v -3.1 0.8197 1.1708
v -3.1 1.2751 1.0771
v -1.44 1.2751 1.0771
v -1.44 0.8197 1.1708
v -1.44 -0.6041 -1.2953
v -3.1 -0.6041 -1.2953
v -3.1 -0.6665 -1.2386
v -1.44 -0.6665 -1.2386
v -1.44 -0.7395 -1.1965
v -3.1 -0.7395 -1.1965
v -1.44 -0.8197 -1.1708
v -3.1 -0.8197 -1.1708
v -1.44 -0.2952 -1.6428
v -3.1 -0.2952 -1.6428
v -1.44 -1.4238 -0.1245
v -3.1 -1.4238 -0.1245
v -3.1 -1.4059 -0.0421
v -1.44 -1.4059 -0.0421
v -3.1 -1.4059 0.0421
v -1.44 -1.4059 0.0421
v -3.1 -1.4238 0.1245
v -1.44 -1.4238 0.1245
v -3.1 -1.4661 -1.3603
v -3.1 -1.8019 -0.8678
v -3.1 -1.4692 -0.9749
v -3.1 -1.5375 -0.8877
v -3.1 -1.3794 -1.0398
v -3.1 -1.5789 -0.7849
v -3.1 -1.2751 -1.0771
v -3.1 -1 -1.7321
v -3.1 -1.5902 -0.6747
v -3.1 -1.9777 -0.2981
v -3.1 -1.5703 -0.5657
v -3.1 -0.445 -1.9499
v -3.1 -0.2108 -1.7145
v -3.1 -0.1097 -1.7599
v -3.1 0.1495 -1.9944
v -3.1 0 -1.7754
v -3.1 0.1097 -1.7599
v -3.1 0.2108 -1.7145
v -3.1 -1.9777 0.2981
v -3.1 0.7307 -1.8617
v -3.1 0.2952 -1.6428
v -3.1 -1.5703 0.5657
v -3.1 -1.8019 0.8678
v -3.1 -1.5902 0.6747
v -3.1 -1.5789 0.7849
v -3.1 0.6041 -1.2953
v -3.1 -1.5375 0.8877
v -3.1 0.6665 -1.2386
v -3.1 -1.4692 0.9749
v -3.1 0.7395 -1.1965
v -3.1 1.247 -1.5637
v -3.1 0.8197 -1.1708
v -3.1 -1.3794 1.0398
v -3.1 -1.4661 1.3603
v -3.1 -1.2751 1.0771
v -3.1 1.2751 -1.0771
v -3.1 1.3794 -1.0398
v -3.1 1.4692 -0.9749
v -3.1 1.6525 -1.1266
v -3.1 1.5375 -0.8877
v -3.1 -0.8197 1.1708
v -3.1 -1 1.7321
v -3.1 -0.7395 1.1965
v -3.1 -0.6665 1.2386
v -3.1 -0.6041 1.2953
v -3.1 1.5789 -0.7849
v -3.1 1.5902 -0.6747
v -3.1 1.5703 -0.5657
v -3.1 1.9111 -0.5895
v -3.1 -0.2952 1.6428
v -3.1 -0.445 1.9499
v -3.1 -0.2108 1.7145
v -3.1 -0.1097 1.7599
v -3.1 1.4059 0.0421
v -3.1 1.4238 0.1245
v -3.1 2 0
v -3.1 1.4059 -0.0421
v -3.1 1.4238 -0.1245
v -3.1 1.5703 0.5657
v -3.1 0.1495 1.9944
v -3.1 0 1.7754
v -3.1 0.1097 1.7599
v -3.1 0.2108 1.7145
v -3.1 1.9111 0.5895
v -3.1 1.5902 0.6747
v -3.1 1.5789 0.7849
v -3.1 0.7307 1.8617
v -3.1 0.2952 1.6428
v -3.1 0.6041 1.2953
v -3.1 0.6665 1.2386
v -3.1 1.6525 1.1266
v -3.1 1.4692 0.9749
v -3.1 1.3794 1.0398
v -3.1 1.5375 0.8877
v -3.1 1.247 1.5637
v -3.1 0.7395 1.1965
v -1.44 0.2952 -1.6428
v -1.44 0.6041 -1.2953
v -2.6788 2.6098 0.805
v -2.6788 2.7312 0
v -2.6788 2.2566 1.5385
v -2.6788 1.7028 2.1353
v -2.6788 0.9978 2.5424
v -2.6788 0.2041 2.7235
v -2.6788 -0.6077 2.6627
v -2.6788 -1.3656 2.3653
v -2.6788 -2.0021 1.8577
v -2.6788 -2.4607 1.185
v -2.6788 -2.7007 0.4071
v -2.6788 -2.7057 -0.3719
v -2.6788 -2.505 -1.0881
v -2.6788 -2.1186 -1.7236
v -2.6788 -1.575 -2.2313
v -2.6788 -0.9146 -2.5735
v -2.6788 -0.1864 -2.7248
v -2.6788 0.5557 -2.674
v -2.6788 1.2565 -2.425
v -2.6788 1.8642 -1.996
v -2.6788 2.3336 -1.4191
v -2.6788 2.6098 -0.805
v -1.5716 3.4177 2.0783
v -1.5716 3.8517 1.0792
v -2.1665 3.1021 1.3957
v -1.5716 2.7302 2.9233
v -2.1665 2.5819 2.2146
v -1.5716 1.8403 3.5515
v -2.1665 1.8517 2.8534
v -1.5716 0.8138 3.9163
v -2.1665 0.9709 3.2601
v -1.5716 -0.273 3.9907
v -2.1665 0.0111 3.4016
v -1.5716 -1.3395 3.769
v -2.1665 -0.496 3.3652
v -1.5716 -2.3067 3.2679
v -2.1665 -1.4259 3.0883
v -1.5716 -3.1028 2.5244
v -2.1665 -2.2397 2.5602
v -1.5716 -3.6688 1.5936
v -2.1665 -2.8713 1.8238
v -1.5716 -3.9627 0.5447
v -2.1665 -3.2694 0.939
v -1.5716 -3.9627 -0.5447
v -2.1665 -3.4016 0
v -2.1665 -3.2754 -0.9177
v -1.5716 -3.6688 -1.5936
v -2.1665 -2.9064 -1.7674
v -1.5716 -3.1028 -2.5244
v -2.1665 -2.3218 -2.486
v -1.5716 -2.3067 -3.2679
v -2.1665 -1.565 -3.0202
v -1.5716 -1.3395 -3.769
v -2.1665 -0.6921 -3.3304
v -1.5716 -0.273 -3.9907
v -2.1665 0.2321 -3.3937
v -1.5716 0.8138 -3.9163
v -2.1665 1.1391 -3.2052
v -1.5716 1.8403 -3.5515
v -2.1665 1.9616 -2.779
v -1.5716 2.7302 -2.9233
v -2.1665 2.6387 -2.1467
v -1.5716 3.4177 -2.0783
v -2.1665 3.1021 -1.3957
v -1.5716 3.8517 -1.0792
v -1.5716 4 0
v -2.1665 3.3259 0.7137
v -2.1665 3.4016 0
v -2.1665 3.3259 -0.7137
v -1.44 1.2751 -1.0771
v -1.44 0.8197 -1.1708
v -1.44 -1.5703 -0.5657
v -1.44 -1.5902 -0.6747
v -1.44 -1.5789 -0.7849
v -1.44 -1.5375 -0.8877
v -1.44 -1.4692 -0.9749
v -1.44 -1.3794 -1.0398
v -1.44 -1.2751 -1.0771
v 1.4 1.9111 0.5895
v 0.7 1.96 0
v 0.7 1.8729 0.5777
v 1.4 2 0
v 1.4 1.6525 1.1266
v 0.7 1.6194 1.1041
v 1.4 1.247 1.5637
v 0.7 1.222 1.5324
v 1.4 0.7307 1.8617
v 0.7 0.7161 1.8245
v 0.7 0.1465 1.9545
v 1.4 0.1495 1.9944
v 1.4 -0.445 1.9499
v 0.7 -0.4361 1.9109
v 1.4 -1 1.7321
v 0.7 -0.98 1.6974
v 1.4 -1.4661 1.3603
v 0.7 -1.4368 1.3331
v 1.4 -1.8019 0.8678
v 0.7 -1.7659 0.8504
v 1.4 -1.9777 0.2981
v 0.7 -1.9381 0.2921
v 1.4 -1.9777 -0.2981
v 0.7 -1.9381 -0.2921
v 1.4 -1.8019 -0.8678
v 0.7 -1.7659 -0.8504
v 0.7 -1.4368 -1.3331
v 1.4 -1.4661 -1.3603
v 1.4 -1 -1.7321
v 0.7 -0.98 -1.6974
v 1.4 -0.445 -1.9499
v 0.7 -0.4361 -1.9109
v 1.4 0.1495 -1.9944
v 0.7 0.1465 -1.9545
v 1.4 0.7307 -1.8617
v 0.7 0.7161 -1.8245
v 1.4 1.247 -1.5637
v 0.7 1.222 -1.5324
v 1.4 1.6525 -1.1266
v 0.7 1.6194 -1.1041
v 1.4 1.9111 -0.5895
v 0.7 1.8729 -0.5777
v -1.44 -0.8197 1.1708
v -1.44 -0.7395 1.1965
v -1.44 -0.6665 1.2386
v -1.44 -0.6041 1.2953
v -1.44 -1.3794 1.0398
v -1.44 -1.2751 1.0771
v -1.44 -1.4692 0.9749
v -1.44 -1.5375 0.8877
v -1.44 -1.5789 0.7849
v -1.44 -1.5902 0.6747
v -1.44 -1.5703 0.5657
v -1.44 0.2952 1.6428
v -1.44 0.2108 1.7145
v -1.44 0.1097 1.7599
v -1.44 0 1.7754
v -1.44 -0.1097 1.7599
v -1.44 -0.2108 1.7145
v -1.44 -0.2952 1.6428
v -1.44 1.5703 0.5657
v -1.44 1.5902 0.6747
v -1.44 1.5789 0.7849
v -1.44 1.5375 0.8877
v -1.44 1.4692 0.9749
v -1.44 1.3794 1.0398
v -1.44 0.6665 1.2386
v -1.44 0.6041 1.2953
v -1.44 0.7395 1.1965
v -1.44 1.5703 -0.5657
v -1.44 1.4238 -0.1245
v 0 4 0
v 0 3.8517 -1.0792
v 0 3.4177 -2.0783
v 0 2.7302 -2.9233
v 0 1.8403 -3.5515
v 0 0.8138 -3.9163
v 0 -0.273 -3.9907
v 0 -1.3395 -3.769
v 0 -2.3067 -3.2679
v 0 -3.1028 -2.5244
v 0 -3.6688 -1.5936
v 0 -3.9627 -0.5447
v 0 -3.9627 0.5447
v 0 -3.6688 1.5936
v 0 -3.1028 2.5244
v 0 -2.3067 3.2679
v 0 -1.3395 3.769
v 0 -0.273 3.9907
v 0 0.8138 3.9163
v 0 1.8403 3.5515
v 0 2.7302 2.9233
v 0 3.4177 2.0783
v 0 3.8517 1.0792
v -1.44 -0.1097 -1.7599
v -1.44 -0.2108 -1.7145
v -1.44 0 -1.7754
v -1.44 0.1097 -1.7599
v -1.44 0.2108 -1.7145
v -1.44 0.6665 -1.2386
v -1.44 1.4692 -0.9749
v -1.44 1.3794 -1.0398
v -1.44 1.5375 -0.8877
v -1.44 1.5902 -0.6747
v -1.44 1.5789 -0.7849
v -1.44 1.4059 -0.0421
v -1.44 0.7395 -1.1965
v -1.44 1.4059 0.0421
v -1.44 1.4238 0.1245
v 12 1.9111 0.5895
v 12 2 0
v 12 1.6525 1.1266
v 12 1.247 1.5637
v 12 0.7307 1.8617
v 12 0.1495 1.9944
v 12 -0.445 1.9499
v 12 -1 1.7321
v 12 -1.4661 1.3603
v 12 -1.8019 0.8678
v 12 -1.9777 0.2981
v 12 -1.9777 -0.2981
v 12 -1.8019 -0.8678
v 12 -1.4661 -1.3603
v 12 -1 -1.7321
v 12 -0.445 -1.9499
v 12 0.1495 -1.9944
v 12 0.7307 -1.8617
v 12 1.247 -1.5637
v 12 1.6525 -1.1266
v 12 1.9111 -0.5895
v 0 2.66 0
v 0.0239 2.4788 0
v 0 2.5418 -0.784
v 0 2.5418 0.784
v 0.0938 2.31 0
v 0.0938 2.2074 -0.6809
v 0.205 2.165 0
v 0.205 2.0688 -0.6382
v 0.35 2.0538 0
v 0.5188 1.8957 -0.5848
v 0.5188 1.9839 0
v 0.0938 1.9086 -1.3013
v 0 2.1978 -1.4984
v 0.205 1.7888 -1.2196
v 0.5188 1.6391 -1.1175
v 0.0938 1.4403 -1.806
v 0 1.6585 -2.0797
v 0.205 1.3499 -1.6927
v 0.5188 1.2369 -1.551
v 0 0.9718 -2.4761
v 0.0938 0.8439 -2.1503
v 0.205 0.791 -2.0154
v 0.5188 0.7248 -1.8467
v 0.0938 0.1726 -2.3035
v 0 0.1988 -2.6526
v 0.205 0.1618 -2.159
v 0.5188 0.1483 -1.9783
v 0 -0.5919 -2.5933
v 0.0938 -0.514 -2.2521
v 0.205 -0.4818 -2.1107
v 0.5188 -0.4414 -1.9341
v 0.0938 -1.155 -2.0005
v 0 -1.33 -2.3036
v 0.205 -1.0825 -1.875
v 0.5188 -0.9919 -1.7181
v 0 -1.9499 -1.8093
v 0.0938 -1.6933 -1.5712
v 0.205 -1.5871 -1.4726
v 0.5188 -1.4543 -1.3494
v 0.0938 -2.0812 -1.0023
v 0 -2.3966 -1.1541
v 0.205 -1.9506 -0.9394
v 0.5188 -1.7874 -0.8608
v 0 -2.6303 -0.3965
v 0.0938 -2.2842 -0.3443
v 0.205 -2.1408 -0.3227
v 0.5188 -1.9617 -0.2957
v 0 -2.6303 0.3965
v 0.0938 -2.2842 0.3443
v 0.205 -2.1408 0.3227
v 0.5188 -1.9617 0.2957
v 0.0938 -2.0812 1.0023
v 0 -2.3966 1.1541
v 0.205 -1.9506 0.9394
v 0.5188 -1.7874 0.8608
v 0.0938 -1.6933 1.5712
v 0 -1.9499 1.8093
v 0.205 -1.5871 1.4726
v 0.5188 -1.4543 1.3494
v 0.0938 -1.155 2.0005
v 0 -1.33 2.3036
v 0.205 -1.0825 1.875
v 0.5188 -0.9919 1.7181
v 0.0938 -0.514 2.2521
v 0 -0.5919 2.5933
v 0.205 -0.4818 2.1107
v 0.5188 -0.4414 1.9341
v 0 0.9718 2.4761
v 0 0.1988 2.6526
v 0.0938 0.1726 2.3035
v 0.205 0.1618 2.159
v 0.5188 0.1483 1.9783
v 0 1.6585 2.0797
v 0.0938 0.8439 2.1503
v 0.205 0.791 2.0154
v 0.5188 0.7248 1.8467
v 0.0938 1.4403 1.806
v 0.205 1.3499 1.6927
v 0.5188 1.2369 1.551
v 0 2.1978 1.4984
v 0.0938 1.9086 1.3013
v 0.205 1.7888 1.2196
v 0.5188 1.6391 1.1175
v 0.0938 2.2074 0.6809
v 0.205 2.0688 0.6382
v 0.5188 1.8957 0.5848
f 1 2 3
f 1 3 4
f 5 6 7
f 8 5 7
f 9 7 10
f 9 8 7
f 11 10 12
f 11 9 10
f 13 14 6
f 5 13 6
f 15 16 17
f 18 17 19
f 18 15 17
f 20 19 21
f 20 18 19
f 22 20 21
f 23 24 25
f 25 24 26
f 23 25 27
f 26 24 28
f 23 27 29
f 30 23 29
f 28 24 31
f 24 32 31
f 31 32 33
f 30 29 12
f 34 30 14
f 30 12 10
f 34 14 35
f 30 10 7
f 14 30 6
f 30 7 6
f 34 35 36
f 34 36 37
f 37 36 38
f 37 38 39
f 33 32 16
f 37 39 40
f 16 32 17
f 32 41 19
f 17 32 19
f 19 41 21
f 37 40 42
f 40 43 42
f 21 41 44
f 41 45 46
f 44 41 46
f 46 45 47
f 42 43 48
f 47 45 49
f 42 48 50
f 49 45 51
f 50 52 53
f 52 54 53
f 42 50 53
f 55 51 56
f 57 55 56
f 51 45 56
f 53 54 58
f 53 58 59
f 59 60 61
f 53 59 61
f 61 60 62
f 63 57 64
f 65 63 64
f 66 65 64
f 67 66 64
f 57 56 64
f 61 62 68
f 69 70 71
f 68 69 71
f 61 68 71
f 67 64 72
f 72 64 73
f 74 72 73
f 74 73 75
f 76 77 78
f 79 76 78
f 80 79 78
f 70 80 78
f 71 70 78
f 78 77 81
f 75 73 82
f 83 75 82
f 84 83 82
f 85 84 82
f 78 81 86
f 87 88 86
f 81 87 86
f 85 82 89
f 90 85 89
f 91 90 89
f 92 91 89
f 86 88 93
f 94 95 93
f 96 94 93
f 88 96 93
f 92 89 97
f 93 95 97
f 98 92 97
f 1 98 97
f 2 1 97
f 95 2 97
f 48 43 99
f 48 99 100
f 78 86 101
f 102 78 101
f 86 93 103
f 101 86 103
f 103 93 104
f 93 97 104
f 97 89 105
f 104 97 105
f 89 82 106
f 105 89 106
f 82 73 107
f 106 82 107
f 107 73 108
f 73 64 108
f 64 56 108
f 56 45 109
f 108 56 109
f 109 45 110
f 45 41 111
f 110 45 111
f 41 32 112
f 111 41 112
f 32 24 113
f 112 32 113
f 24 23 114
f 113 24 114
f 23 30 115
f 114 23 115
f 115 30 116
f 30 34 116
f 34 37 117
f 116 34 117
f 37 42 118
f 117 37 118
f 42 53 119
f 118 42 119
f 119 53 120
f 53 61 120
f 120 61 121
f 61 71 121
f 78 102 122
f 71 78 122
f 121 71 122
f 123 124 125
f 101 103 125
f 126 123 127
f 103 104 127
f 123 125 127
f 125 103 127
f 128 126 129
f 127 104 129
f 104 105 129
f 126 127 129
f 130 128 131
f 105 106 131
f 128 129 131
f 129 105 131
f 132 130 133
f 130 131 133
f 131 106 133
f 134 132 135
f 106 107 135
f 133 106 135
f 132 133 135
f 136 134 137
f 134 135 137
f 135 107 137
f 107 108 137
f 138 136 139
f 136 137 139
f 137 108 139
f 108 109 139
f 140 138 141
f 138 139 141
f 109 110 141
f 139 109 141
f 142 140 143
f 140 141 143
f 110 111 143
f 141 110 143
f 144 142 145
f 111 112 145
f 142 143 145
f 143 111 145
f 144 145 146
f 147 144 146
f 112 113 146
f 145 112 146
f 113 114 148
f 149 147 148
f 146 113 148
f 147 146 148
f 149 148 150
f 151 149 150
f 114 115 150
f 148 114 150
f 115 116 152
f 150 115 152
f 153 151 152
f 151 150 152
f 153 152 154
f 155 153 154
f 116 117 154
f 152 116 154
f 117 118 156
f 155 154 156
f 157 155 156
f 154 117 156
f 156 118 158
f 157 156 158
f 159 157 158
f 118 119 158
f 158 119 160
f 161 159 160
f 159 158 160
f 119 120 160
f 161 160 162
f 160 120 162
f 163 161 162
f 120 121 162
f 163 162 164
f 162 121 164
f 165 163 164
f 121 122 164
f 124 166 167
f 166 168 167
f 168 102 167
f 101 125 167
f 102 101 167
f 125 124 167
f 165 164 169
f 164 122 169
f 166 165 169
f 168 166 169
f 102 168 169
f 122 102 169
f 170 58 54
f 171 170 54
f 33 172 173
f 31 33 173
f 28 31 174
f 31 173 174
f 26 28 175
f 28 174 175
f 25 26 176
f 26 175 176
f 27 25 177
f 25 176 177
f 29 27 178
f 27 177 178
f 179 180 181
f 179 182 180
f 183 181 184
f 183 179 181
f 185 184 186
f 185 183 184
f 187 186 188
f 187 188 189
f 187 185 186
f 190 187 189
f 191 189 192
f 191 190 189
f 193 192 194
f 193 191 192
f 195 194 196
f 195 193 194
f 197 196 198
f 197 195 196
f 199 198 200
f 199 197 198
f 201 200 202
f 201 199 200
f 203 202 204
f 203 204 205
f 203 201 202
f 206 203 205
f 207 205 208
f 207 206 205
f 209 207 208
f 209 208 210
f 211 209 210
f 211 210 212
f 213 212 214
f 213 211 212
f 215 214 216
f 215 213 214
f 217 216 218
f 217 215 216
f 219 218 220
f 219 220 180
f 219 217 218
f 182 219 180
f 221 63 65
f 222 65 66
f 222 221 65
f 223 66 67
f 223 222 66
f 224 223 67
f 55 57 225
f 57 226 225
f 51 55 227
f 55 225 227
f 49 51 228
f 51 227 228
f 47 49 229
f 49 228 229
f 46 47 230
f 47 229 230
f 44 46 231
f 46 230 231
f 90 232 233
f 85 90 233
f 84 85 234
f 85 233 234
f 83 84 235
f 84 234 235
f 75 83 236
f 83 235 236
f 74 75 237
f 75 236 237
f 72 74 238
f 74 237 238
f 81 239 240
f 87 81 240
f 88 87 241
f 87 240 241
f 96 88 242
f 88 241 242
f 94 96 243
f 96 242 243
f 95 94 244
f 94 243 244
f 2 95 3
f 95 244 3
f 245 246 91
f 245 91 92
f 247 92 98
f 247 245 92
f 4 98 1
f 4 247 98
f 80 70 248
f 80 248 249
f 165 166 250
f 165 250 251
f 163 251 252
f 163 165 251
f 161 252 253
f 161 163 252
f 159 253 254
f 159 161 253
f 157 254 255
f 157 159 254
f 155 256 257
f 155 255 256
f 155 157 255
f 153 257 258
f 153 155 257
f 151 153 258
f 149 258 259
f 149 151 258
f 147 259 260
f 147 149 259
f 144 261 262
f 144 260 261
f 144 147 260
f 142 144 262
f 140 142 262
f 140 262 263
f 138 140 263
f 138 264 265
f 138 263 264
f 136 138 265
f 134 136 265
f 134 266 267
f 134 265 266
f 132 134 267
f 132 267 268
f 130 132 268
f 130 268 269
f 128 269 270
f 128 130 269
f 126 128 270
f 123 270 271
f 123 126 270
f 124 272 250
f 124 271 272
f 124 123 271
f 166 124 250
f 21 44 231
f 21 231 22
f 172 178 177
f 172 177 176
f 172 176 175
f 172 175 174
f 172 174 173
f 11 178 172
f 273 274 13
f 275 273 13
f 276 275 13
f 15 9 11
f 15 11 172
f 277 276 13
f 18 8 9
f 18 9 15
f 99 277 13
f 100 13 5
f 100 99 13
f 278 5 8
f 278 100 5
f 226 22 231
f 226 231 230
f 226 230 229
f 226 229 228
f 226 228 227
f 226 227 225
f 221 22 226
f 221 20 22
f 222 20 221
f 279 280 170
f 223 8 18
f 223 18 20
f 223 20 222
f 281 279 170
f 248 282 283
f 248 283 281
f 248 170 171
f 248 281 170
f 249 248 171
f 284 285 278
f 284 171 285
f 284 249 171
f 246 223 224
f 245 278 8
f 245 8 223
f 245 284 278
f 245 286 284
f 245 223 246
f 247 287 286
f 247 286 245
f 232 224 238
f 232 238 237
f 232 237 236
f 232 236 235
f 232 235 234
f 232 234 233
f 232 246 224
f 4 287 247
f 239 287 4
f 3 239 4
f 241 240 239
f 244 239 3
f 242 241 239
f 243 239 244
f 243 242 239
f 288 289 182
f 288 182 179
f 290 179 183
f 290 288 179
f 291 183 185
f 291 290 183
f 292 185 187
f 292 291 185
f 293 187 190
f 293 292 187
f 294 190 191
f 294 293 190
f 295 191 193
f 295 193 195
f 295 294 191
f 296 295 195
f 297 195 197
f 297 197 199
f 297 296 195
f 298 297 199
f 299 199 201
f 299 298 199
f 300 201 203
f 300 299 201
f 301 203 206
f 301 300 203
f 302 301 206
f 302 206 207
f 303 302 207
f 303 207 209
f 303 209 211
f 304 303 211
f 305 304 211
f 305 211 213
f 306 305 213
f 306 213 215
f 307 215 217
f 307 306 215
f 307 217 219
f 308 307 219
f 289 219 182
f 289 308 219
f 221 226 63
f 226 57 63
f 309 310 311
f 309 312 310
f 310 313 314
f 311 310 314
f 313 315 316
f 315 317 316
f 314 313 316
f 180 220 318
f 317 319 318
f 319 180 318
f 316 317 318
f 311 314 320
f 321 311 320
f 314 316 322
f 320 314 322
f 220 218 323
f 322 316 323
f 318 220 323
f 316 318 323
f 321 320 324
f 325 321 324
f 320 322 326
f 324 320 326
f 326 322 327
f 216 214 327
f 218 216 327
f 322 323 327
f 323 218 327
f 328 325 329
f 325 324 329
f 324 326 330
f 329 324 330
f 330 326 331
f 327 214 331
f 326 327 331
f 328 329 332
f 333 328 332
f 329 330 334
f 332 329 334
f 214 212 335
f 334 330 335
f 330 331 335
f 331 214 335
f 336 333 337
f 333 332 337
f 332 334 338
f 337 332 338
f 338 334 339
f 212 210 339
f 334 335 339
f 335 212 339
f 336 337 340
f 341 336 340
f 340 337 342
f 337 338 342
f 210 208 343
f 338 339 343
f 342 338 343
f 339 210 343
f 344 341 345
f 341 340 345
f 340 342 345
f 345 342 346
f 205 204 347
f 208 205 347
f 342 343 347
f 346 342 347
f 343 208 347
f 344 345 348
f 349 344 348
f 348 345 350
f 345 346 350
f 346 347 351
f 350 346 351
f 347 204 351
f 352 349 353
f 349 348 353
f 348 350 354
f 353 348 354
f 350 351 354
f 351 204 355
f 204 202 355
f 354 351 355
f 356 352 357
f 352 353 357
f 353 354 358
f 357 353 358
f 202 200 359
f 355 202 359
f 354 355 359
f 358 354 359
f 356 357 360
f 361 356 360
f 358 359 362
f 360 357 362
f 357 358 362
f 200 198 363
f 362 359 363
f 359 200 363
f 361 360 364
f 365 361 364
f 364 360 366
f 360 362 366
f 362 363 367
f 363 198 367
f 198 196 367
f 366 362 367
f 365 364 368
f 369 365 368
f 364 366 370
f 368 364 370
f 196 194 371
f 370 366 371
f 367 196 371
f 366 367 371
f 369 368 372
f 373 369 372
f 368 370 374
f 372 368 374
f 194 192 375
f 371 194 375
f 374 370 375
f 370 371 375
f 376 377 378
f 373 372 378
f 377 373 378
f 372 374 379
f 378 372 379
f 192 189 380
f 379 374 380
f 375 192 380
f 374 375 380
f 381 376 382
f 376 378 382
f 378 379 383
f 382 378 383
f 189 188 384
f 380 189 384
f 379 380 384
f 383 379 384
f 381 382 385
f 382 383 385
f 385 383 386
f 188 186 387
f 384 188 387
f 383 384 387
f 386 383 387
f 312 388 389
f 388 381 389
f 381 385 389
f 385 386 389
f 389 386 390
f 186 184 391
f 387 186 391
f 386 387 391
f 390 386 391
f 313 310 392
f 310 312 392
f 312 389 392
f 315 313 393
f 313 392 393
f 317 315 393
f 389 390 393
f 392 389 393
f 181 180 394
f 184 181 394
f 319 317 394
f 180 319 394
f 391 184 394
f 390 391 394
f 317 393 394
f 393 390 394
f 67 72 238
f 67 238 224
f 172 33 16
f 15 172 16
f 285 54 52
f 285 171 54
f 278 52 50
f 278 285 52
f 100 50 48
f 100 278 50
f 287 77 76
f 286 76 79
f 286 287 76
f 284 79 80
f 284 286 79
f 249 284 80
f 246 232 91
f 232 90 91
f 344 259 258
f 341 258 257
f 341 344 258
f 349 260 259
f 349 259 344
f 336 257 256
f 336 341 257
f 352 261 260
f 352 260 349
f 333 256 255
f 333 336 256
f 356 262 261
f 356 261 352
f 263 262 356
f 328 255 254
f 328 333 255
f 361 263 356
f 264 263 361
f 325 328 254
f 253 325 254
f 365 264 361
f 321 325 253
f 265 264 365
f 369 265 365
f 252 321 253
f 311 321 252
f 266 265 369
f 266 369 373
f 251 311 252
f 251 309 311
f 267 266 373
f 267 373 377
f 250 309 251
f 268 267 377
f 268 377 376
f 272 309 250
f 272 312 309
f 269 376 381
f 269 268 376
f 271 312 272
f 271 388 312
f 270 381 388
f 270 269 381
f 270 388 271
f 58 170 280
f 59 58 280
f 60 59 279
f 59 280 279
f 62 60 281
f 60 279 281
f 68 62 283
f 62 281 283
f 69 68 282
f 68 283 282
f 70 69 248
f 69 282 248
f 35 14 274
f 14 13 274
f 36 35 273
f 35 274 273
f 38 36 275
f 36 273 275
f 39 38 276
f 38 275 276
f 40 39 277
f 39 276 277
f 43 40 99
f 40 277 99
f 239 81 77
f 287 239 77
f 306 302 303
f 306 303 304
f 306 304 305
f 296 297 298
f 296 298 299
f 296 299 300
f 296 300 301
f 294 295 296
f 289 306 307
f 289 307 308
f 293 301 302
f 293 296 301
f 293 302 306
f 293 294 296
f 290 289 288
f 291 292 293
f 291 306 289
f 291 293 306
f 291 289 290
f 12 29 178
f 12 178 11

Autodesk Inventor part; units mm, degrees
ref_plane "YZ Plane" through (0, 0, 0) normal (1, 0, 0) x (0, 1, 0)
ref_plane "XZ Plane" through (0, 0, 0) normal (0, 1, 0) x (-1, 0, 0)
ref_plane "XY Plane" through (0, 0, 0) normal (0, 0, 1) x (1, 0, 0)
sketch "Sketch4" plane through (0, 0, 0) normal (0, 0, 1) x (1, 0, 0)
  line L0 (-3.1, 0) -> (12, 0)
  line L1 (0, 0) -> (-3.1, 0)
  line L2 (0, 4) -> (0, 2.66)
  line L3 (0.7, 1.96) -> (0.7, 1.96)
  line L4 (0.7, 1.96) -> (1.4, 2)
  arc A0 (0, 2.66) -> (0.7, 1.96) centre (0.7, 2.66) ccw
  line L5 (-3.1, 0) -> (-3.1, 2)
  line L6 (0, 4) -> (-1.5716, 4)
  arc A1 (-1.5716, 4) -> (-3.1, 2) centre (2.731, -0.8721) ccw
  line L7 (1.4, 2) -> (12, 2)
  line L8 (12, 2) -> (12, 0)
  point P0 (0, 1.96)
  dimension "d71" = 0.7
  dimension "d72" = 12
  dimension "d74" = 0.7
  dimension "d75" = 3.92
  dimension "d78" = 4
  dimension "d82" = 6.5
  dimension "d83" = 3.1
  dimension "d84" = 8
  dimension "d104" = 10.6
  dimension "d105" = 4
revolve "Revolution7" add sketch "Sketch4" angle 360 about axis through (-3.1, 0, 0) along (1, 0, 0)
sketch "Sketch5" plane through (-3.1, 0, 0) normal (-1, 0, 0) x (0, 0, 1)
  circle A0 centre (0, 0) radius 1.975 construction
  circle A1 centre (0, 0) radius 1.3825 construction
  line L0 (0, 0) -> (-1.1973, 0.6912)
  line L1 (0, 0) -> (-1.1973, -0.6912)
  line L2 (-1.8008, 0) -> (1.7887, 0)
  line L3 (-1.975, 0) -> (-1.1973, -0.6912)
  line L4 (-1.975, 0) -> (-1.1973, 0.6912)
  point P0 (0, 0)
  dimension "d88" = 3.95
  dimension "d89" = 2.765
  dimension "d90" = 30
  dimension "d91" = 30
extrude "Extrusion1" cut sketch "Sketch5" against normal blind 1.66
pattern_circular "Circular Pattern1" count 6 over 360 about axis through (-10, 0, 0) along (1, 0, 0) of "Extrusion1"
fillet "Fillet1" radius 0.395 12 edges at (-2.27, -1.7104, -0.9875) (-2.27, -0.6912, -1.1973) (-2.27, -1.3825, 0) (-2.27, -1.7104, 0.9875) (-2.27, -0.6912, 1.1973) (-2.27, 0, 1.975) (-2.27, 1.3825, 0) (-2.27, 1.7104, 0.9875) (-2.27, 0.6913, 1.1973) (-2.27, 0.6912, -1.1973) (-2.27, 0, -1.975) (-2.27, 1.7104, -0.9875)
thread "Thread7" size "M4x0.7" class "6g" standard "ISO Metric profile" length 10.6
equation "\"a\" = 1.4"
equation "\"b\" = 10.6"
equation "\"dk\" = 8"
equation "\"k\" = 3.1"
equation "\"r\" = 0.7"
equation "\"rf\" = 6.5"
equation "\"x\" = 0.7"
equation "\"A_\" = 3.95"
equation "\"t\" = 1.66"
equation "\"p\" = 0.7"
equation "\"l_\" = 12"
equation "\"d\" = 4"
equation "\"ds_\" = 3.92"
equation "\"lg\" = 0"
properties part number "Flachkopfschraube mit Innenrund ISO 14583 - M4 x 12 - A3-70" material "Edelstahl"
